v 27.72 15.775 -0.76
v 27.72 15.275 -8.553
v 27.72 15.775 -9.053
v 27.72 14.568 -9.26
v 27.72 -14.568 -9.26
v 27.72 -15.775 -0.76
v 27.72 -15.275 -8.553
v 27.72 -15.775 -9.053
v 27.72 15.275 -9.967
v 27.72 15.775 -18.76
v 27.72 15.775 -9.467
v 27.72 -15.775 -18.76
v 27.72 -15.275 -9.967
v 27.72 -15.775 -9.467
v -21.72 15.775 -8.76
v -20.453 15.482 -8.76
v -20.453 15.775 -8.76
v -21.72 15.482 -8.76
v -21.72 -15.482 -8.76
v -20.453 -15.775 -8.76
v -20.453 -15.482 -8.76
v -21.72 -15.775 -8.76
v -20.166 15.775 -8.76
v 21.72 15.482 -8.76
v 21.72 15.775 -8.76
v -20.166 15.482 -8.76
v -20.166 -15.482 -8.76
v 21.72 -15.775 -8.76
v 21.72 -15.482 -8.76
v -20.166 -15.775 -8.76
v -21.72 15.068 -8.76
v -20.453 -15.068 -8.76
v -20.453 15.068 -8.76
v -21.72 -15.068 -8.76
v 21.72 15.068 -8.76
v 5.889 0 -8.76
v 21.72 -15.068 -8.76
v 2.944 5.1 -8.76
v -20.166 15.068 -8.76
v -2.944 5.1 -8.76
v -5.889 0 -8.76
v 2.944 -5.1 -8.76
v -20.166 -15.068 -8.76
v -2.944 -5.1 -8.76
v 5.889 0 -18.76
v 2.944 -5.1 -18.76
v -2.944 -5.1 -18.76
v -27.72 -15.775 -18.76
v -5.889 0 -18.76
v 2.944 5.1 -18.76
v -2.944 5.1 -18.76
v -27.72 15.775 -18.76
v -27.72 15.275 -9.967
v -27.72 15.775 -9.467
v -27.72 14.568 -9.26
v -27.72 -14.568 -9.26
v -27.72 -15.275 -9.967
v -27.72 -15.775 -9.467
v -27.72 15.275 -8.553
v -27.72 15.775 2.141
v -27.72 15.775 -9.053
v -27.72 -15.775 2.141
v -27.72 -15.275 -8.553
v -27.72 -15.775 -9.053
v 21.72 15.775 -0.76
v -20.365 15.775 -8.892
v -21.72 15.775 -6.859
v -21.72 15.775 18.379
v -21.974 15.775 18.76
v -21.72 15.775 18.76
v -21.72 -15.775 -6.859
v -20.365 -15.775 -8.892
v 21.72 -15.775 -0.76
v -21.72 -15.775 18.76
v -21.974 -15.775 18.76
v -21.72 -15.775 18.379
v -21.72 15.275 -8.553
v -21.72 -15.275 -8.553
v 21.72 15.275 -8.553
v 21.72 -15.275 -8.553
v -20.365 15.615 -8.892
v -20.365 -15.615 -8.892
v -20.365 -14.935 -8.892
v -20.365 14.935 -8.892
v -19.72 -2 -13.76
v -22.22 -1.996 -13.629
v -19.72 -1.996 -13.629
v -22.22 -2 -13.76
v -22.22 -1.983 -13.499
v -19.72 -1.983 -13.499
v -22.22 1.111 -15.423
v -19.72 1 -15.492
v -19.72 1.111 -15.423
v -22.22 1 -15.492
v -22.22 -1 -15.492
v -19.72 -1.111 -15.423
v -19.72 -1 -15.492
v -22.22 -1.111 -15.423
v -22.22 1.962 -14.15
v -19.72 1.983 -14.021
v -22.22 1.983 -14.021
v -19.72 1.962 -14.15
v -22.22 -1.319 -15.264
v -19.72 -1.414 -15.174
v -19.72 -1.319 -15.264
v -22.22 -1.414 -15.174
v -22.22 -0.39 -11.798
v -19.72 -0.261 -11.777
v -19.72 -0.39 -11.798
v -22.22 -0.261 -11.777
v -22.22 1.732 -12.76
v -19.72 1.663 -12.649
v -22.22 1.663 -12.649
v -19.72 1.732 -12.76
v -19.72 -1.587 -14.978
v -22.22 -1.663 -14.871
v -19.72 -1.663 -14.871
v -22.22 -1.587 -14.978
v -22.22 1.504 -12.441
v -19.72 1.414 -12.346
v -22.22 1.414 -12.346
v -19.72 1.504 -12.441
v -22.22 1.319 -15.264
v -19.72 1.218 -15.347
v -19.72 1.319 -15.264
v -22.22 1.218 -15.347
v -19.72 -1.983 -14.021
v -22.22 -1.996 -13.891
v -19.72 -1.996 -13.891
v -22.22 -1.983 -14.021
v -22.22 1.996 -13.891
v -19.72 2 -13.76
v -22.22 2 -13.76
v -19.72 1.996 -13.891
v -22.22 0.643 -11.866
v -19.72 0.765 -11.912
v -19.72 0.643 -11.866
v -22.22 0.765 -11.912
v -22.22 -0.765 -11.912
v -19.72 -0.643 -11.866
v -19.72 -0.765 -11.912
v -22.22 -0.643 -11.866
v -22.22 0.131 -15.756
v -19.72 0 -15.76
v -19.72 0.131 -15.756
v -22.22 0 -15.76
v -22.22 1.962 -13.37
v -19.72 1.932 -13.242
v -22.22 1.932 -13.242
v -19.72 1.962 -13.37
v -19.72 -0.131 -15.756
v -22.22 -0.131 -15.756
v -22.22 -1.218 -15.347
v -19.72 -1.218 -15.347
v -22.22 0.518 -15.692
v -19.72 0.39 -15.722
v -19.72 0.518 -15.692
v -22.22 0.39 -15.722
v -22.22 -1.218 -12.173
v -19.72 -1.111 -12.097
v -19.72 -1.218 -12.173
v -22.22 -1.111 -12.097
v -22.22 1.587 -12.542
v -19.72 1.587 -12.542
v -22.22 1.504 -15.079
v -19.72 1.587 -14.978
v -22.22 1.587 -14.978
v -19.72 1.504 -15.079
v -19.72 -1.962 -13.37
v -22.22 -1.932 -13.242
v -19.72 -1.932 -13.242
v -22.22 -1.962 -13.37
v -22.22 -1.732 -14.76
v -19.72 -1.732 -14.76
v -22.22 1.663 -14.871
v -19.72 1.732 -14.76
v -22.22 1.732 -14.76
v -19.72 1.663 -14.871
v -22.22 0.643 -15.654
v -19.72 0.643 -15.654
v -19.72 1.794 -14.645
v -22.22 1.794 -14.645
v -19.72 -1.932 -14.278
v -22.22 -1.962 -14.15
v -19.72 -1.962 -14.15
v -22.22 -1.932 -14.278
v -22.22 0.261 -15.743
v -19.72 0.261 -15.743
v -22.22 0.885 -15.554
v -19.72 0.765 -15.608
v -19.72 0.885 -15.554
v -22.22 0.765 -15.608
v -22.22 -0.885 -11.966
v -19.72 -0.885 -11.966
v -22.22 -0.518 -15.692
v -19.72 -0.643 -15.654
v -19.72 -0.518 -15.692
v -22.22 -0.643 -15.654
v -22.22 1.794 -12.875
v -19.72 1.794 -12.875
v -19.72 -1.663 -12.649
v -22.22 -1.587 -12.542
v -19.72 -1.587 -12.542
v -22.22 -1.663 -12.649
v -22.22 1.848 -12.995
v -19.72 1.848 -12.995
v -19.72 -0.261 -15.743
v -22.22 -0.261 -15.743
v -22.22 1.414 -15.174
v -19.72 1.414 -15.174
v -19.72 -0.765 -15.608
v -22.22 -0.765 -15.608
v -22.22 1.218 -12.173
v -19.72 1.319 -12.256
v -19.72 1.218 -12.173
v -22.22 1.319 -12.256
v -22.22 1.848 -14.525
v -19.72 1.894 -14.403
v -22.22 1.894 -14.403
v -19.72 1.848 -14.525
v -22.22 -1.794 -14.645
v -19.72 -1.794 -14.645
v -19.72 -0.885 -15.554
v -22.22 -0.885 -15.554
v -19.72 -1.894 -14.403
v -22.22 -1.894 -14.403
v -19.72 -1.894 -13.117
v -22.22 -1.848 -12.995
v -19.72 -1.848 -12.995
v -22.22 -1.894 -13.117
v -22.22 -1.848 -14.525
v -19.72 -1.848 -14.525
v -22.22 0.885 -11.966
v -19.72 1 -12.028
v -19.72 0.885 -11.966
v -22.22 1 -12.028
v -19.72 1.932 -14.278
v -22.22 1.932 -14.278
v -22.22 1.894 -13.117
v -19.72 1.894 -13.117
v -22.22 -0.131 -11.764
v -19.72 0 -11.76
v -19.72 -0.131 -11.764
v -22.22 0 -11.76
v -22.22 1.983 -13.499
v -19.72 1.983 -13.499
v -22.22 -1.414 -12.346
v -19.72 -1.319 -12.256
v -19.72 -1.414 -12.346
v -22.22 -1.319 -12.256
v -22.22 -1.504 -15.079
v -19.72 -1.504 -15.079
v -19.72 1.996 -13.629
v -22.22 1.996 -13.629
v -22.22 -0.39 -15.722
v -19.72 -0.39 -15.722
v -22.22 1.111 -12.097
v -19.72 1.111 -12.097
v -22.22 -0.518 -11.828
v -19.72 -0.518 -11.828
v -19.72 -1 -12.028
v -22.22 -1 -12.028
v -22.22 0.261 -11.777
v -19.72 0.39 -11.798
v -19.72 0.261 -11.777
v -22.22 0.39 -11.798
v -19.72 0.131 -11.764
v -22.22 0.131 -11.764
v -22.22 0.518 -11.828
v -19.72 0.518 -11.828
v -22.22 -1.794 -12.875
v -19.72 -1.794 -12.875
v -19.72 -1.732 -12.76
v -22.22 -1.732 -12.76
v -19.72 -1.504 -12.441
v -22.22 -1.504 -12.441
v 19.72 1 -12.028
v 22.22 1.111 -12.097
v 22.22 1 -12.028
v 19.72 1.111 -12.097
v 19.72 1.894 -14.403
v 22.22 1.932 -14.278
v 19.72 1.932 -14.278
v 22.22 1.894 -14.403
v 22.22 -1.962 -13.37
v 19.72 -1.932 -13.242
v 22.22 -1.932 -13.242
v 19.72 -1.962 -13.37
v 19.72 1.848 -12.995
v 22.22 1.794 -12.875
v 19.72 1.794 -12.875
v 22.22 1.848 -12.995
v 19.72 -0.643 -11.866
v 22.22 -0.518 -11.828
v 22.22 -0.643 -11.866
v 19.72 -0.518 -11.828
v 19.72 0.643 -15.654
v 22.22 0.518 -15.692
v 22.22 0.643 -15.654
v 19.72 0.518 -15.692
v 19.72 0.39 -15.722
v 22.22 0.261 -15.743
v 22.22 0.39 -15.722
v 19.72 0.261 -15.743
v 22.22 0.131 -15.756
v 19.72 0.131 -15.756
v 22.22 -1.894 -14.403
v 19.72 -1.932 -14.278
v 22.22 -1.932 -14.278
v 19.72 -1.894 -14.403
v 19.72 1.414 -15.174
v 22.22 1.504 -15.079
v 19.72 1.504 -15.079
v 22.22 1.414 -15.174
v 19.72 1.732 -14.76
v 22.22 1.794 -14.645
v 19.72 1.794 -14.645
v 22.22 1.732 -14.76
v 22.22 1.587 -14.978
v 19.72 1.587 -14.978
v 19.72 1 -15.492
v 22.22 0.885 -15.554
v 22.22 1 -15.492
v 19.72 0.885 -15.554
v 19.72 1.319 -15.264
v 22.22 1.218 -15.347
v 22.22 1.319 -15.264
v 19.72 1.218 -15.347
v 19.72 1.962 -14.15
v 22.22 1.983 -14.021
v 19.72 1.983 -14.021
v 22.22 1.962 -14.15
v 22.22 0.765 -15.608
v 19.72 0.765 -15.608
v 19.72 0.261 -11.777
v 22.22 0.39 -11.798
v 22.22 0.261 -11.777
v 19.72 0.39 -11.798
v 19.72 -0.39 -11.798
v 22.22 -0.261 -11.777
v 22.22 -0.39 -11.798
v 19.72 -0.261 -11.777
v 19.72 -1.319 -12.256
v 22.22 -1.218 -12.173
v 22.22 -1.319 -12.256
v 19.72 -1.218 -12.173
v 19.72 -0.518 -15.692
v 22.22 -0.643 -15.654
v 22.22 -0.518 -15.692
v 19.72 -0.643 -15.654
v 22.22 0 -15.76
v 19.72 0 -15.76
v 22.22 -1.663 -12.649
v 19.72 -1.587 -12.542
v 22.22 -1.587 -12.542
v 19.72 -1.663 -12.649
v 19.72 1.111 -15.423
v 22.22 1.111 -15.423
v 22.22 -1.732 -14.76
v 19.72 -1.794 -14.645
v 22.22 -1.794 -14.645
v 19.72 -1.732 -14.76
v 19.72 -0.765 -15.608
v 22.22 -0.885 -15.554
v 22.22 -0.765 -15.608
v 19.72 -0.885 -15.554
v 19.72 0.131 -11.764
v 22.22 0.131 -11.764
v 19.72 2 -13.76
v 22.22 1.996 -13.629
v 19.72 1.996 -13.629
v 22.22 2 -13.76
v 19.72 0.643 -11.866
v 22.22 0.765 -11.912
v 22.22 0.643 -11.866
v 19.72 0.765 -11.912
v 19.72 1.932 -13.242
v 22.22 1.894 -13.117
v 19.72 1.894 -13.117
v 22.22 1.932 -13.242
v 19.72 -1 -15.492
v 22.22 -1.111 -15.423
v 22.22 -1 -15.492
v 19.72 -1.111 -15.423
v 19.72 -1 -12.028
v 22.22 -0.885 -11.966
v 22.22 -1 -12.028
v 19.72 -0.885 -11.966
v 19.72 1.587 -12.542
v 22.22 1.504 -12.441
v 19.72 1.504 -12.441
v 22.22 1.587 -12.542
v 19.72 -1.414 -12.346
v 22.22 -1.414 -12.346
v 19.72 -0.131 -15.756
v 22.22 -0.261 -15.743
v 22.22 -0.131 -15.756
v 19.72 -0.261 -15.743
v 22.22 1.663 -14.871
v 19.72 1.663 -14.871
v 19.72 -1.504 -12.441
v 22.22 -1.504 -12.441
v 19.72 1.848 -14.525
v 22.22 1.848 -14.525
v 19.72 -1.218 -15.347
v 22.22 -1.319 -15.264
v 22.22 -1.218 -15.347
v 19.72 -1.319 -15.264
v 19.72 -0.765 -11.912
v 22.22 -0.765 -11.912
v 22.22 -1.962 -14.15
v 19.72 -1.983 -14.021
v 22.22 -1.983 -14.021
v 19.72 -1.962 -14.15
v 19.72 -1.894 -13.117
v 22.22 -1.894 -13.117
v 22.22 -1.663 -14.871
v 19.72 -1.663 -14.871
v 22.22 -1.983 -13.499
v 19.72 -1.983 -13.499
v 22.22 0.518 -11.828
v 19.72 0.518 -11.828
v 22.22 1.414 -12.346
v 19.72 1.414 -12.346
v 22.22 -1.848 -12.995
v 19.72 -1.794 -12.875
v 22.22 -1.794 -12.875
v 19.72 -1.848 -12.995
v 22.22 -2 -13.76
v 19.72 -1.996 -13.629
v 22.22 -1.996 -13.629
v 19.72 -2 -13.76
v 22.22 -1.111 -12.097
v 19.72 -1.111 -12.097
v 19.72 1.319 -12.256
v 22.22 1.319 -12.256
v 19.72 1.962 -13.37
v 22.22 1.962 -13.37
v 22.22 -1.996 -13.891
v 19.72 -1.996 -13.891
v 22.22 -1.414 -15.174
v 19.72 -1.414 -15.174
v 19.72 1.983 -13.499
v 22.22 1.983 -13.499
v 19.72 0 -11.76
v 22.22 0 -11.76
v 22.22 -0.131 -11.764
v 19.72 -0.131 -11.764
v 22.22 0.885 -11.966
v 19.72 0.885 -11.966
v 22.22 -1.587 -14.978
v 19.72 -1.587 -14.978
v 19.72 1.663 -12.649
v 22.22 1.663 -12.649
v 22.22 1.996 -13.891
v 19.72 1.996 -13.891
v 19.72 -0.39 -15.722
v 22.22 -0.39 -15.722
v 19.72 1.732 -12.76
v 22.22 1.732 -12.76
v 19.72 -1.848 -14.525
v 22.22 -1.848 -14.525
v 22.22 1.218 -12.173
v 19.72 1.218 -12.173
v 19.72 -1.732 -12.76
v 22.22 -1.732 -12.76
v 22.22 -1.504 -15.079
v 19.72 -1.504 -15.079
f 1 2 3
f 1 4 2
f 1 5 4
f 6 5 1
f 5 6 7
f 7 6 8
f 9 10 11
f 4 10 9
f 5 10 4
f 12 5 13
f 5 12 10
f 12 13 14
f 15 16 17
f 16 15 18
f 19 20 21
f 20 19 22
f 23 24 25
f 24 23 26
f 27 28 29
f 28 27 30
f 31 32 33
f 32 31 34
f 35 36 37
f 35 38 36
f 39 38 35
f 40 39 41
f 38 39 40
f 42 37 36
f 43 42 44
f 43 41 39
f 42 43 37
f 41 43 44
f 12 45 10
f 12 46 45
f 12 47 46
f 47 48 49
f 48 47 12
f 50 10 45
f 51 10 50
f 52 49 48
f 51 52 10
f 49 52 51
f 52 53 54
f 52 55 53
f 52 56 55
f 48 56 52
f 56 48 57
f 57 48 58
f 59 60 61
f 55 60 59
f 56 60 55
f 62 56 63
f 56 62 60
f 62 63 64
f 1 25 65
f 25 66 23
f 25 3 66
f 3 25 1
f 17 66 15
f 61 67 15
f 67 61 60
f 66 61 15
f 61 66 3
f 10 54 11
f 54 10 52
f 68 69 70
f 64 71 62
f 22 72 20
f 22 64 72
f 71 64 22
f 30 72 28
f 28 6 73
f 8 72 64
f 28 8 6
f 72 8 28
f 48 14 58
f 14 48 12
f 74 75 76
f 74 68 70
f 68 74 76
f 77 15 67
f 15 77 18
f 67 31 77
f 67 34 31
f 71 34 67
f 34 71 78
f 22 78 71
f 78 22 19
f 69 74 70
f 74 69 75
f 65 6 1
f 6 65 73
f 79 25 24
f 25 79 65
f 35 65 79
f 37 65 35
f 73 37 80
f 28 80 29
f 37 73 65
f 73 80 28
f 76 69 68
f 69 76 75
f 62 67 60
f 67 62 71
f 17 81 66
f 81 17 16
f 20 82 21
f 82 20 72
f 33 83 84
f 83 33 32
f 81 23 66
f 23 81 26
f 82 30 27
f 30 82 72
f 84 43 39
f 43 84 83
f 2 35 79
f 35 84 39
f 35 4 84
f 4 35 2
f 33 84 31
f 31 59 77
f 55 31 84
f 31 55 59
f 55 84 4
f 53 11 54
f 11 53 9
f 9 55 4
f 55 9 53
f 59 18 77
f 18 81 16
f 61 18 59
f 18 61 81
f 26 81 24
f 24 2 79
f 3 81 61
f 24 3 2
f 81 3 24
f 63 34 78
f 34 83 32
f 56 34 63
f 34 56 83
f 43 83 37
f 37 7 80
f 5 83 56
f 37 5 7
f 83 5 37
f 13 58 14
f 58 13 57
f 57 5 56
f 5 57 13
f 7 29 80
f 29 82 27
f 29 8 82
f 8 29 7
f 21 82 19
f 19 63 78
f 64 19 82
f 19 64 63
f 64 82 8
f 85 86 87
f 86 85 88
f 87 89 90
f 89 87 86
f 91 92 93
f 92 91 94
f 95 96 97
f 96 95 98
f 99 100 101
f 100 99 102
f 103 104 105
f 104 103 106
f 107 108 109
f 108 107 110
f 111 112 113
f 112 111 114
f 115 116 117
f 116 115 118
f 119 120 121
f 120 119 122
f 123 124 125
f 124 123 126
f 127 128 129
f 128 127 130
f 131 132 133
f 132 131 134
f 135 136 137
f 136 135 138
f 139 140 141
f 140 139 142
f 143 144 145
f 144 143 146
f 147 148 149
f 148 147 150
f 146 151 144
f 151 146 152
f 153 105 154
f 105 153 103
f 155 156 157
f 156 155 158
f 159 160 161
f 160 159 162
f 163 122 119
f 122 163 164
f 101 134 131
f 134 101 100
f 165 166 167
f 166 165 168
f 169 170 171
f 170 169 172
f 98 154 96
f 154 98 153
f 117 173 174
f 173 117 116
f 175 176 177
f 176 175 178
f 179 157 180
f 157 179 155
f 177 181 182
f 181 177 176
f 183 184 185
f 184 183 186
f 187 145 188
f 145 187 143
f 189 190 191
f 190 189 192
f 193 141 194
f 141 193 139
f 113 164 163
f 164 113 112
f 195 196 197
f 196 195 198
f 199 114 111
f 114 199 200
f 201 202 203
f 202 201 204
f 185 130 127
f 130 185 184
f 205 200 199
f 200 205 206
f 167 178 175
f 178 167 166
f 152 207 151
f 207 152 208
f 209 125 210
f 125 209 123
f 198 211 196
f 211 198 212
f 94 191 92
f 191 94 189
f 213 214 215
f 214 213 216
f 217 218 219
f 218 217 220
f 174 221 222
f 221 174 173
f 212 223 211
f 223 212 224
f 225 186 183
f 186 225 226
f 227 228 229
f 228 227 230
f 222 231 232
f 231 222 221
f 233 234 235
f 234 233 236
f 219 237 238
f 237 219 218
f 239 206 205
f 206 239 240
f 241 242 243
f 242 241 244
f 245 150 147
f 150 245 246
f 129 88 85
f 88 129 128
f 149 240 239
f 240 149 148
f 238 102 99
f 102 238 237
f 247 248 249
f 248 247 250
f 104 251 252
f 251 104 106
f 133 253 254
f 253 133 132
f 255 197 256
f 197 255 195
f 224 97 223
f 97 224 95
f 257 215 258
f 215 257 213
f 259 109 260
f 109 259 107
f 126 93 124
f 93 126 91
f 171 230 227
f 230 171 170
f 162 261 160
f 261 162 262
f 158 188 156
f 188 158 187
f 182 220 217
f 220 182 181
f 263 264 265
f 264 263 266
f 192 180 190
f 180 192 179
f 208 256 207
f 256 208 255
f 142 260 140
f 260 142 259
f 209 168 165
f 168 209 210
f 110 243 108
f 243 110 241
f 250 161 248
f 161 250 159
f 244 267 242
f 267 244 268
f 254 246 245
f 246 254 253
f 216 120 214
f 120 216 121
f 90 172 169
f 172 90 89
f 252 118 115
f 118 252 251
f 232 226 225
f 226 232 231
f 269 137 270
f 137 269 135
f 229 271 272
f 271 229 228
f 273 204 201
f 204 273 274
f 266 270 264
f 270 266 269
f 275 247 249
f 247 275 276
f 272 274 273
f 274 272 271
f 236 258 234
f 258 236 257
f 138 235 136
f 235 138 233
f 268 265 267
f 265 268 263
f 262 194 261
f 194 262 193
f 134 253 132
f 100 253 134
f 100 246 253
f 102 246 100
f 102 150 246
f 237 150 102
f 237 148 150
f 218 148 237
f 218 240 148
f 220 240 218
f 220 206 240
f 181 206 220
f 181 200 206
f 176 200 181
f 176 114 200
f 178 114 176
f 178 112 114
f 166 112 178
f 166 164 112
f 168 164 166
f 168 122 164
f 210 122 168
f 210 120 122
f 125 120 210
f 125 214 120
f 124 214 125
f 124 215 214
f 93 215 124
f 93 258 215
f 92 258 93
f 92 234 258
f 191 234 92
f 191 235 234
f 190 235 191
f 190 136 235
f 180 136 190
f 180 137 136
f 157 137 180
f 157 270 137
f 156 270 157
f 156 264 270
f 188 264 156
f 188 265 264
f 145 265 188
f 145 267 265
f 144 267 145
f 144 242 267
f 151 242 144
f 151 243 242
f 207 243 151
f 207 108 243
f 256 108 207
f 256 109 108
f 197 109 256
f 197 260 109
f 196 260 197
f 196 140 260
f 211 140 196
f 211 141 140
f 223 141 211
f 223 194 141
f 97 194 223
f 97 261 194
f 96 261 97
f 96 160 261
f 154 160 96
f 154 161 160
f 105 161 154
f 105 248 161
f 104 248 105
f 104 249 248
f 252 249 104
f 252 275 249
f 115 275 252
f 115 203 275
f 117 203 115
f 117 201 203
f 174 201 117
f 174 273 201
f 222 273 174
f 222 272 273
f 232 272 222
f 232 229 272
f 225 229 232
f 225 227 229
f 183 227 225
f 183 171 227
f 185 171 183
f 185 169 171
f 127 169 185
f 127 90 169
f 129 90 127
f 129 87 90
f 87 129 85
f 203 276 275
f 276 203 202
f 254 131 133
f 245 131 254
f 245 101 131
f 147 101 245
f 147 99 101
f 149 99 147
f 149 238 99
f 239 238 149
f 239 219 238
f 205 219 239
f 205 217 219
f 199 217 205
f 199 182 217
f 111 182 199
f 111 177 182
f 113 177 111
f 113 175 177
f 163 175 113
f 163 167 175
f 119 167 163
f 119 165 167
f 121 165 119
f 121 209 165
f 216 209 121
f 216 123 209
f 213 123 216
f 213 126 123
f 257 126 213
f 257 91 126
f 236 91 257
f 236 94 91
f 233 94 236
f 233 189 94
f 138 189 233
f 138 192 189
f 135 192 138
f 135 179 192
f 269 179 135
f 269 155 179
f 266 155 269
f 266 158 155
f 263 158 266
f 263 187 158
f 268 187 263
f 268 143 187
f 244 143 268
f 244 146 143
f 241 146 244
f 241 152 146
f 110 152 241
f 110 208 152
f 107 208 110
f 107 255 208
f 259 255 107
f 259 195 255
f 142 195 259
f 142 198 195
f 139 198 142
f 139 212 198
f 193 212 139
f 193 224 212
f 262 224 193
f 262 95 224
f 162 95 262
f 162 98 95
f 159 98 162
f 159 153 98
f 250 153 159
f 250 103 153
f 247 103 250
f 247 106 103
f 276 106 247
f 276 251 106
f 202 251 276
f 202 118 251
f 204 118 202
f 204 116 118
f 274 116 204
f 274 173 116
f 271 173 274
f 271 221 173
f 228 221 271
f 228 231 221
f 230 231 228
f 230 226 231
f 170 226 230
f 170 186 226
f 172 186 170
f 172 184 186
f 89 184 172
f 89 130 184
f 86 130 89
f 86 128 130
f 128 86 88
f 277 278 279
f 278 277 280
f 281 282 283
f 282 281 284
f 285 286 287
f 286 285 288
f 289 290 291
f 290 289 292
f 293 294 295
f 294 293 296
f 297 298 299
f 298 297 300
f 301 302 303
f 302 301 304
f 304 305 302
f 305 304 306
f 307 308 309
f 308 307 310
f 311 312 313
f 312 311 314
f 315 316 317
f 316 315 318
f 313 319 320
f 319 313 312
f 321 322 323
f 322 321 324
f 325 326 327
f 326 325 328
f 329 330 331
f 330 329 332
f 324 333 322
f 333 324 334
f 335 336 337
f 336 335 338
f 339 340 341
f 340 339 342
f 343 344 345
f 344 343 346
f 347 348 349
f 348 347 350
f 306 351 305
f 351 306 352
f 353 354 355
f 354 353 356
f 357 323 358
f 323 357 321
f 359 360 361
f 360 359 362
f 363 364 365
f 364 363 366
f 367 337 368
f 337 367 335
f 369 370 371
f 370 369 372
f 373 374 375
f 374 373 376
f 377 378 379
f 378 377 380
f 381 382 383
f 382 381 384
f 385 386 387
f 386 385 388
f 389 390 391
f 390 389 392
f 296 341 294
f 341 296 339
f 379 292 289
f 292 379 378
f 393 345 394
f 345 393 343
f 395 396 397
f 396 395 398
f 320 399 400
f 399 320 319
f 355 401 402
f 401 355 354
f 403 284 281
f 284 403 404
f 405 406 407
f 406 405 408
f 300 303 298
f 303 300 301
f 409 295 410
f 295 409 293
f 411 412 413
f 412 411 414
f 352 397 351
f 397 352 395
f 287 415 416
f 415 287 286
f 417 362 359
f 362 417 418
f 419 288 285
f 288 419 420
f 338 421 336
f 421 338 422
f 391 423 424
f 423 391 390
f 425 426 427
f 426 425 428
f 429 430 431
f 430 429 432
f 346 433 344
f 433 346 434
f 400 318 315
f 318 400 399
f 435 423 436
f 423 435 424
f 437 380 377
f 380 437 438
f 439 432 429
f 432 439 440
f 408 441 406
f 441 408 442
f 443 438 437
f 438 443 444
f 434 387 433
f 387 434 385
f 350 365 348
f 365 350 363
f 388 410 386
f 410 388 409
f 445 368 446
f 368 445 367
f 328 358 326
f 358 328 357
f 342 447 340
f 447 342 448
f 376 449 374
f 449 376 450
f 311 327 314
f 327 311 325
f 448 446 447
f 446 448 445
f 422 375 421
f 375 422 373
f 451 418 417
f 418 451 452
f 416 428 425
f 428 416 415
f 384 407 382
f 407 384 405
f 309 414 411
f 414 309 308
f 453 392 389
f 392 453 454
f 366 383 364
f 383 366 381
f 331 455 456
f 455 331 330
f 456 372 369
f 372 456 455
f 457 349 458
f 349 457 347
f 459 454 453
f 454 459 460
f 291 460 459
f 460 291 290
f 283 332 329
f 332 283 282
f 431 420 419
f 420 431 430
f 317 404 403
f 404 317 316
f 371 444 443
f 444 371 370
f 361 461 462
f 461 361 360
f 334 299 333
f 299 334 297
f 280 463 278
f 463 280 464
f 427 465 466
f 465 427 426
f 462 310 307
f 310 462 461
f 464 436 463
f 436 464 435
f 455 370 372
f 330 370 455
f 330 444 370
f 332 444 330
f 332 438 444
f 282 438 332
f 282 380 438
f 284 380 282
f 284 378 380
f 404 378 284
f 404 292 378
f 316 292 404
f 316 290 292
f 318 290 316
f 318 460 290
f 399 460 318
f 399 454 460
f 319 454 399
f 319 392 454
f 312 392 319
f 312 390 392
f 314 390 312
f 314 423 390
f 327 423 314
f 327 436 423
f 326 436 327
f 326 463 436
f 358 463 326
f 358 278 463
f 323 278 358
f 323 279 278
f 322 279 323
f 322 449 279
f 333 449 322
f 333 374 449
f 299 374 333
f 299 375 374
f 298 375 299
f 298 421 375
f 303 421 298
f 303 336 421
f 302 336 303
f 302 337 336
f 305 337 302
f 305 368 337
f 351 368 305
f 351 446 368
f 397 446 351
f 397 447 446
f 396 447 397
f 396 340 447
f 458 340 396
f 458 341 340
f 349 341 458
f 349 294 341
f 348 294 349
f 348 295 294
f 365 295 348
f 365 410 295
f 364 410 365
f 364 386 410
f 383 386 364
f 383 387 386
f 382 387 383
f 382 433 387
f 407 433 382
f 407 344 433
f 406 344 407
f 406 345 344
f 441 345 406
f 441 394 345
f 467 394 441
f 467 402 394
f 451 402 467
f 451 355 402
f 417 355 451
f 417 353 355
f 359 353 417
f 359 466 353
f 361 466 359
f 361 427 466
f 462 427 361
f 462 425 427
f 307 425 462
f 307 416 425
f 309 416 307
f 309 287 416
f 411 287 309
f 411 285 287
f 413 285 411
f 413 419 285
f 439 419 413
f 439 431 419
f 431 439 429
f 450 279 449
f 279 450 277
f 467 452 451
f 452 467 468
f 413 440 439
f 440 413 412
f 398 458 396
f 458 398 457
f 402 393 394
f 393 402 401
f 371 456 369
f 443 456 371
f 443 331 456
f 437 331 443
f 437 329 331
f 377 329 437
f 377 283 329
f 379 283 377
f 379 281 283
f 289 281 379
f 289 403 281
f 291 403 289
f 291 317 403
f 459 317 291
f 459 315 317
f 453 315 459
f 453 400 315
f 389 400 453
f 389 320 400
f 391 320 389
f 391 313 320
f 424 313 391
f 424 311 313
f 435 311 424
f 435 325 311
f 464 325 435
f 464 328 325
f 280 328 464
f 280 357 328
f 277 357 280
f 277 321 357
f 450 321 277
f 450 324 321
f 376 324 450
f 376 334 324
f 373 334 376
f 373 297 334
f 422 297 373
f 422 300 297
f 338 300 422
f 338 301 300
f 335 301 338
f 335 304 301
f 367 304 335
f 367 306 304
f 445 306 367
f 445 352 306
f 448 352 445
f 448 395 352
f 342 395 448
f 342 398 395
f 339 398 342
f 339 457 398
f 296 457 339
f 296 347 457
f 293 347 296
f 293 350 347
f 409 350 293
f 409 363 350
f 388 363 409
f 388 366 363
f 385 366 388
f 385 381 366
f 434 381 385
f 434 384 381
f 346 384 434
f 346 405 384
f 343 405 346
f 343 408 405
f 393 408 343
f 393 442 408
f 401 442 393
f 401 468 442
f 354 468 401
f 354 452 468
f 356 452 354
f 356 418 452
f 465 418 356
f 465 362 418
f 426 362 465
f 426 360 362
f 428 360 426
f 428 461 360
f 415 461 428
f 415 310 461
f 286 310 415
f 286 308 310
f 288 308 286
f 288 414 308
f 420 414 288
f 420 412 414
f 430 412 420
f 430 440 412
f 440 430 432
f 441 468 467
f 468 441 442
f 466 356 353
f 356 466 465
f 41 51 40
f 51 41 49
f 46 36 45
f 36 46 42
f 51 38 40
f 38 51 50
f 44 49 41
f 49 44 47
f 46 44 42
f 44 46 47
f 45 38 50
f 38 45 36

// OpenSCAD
// Connected L/C bracket with clear end-plate slope and through hex hole
// Bounding box target: 55.44 x 31.55 x 37.52 mm (X x Y x Z)

$fn = 96;

// Bounding box
bbox_L = 55.44;
bbox_W = 31.55;
bbox_H = 37.52;

// Main members
beam_L = bbox_L;
beam_W = bbox_W;
beam_H = 10;

end_plate_t = 6;
end_plate_H = bbox_H;

leg_t = 6;
leg_H = 18;

// Hex hole (through beam thickness, along Z)
hex_AF = 10;
hex_axis_angle_deg = 0;
hex_center_x_from_left = 27.72;
hex_center_y_from_front = 15.775;
hex_clearance = 0.2;

// End-plate slope (top chamfer)
slope_drop = 8;
slope_run  = 12;

// Small edge chamfers on beam (optional)
beam_edge_chamfer = 1;

// Small cylindrical reliefs at junctions
relief_r = 2;
relief_depth = 1.5;

overlap = 0.5;

// Helpers
function hex_R_from_AF(af) = af / sqrt(3); // circumradius for pointy-top hex when AF is across flats

module horizontal_beam() {
  translate([0, 0, -bbox_H/2 + beam_H/2])
    cube([beam_L, beam_W, beam_H], center=true);
}

module tall_vertical_end_plate() {
  translate([-beam_L/2 + end_plate_t/2, 0, -bbox_H/2 + end_plate_H/2])
    cube([end_plate_t, beam_W, end_plate_H], center=true);
}

module short_vertical_support_leg() {
  translate([beam_L/2 - leg_t/2, 0, -bbox_H/2 + leg_H/2])
    cube([leg_t, beam_W, leg_H], center=true);
}

module hex_hole_prism() {
  af = hex_AF + hex_clearance;
  R  = hex_R_from_AF(af);

  // Centered in XY, extruded through beam thickness in Z
  translate([
      -beam_L/2 + hex_center_x_from_left,
      -beam_W/2 + hex_center_y_from_front,
      -bbox_H/2 + beam_H/2
    ])
    rotate([0, 0, hex_axis_angle_deg])
      linear_extrude(height=beam_H + 2*overlap, center=true)
        polygon(points=[
          [ R, 0],
          [ R/2,  af/2],
          [-R/2,  af/2],
          [-R, 0],
          [-R/2, -af/2],
          [ R/2, -af/2]
        ]);
}

module slope_cut_wedge() {
  // Cut a wedge from the TOP of the tall end plate to create a visible sloped face.
  // Slope runs along +X (from left edge toward beam), dropping in Z by slope_drop over slope_run.
  ang = atan(slope_drop / slope_run);

  x_left = -beam_L/2;
  x_right = x_left + end_plate_t;
  z_top = -bbox_H/2 + end_plate_H;

  // Use a large cutter rotated about Y; positioned so it intersects the plate top.
  // Make it wide in Y and tall in Z to guarantee a clean cut.
  translate([x_right - slope_run/2, 0, z_top - slope_drop/2])
    rotate([0, -ang, 0])
      cube([slope_run + 4*overlap, beam_W + 4*overlap, slope_drop + end_plate_H + 4*overlap], center=true);
}

module beam_chamfer_wedge_top_front() {
  if (beam_edge_chamfer > 0)
    translate([0, beam_W/2 - beam_edge_chamfer/2, -bbox_H/2 + beam_H - beam_edge_chamfer/2])
      rotate([45, 0, 0])
        cube([beam_L + 4*overlap, beam_edge_chamfer, beam_edge_chamfer], center=true);
}

module beam_chamfer_wedge_top_back() {
  if (beam_edge_chamfer > 0)
    translate([0, -beam_W/2 + beam_edge_chamfer/2, -bbox_H/2 + beam_H - beam_edge_chamfer/2])
      rotate([-45, 0, 0])
        cube([beam_L + 4*overlap, beam_edge_chamfer, beam_edge_chamfer], center=true);
}

module alignment_relief_left() {
  // Relief at left plate/beam junction (cuts into beam near plate)
  translate([-beam_L/2 + end_plate_t + relief_depth/2, 0, -bbox_H/2 + beam_H/2])
    rotate([0, 90, 0])
      cylinder(r=relief_r, h=relief_depth + 2*overlap, center=true);
}

module alignment_relief_right() {
  // Relief at right leg/beam junction (cuts into beam near leg)
  translate([beam_L/2 - leg_t - relief_depth/2, 0, -bbox_H/2 + beam_H/2])
    rotate([0, 90, 0])
      cylinder(r=relief_r, h=relief_depth + 2*overlap, center=true);
}

module final_bracket() {
  difference() {
    union() {
      horizontal_beam();
      tall_vertical_end_plate();
      short_vertical_support_leg();
    }

    // Cuts
    slope_cut_wedge();
    beam_chamfer_wedge_top_front();
    beam_chamfer_wedge_top_back();
    alignment_relief_left();
    alignment_relief_right();
    hex_hole_prism();
  }
}

color("Silver") final_bracket();
